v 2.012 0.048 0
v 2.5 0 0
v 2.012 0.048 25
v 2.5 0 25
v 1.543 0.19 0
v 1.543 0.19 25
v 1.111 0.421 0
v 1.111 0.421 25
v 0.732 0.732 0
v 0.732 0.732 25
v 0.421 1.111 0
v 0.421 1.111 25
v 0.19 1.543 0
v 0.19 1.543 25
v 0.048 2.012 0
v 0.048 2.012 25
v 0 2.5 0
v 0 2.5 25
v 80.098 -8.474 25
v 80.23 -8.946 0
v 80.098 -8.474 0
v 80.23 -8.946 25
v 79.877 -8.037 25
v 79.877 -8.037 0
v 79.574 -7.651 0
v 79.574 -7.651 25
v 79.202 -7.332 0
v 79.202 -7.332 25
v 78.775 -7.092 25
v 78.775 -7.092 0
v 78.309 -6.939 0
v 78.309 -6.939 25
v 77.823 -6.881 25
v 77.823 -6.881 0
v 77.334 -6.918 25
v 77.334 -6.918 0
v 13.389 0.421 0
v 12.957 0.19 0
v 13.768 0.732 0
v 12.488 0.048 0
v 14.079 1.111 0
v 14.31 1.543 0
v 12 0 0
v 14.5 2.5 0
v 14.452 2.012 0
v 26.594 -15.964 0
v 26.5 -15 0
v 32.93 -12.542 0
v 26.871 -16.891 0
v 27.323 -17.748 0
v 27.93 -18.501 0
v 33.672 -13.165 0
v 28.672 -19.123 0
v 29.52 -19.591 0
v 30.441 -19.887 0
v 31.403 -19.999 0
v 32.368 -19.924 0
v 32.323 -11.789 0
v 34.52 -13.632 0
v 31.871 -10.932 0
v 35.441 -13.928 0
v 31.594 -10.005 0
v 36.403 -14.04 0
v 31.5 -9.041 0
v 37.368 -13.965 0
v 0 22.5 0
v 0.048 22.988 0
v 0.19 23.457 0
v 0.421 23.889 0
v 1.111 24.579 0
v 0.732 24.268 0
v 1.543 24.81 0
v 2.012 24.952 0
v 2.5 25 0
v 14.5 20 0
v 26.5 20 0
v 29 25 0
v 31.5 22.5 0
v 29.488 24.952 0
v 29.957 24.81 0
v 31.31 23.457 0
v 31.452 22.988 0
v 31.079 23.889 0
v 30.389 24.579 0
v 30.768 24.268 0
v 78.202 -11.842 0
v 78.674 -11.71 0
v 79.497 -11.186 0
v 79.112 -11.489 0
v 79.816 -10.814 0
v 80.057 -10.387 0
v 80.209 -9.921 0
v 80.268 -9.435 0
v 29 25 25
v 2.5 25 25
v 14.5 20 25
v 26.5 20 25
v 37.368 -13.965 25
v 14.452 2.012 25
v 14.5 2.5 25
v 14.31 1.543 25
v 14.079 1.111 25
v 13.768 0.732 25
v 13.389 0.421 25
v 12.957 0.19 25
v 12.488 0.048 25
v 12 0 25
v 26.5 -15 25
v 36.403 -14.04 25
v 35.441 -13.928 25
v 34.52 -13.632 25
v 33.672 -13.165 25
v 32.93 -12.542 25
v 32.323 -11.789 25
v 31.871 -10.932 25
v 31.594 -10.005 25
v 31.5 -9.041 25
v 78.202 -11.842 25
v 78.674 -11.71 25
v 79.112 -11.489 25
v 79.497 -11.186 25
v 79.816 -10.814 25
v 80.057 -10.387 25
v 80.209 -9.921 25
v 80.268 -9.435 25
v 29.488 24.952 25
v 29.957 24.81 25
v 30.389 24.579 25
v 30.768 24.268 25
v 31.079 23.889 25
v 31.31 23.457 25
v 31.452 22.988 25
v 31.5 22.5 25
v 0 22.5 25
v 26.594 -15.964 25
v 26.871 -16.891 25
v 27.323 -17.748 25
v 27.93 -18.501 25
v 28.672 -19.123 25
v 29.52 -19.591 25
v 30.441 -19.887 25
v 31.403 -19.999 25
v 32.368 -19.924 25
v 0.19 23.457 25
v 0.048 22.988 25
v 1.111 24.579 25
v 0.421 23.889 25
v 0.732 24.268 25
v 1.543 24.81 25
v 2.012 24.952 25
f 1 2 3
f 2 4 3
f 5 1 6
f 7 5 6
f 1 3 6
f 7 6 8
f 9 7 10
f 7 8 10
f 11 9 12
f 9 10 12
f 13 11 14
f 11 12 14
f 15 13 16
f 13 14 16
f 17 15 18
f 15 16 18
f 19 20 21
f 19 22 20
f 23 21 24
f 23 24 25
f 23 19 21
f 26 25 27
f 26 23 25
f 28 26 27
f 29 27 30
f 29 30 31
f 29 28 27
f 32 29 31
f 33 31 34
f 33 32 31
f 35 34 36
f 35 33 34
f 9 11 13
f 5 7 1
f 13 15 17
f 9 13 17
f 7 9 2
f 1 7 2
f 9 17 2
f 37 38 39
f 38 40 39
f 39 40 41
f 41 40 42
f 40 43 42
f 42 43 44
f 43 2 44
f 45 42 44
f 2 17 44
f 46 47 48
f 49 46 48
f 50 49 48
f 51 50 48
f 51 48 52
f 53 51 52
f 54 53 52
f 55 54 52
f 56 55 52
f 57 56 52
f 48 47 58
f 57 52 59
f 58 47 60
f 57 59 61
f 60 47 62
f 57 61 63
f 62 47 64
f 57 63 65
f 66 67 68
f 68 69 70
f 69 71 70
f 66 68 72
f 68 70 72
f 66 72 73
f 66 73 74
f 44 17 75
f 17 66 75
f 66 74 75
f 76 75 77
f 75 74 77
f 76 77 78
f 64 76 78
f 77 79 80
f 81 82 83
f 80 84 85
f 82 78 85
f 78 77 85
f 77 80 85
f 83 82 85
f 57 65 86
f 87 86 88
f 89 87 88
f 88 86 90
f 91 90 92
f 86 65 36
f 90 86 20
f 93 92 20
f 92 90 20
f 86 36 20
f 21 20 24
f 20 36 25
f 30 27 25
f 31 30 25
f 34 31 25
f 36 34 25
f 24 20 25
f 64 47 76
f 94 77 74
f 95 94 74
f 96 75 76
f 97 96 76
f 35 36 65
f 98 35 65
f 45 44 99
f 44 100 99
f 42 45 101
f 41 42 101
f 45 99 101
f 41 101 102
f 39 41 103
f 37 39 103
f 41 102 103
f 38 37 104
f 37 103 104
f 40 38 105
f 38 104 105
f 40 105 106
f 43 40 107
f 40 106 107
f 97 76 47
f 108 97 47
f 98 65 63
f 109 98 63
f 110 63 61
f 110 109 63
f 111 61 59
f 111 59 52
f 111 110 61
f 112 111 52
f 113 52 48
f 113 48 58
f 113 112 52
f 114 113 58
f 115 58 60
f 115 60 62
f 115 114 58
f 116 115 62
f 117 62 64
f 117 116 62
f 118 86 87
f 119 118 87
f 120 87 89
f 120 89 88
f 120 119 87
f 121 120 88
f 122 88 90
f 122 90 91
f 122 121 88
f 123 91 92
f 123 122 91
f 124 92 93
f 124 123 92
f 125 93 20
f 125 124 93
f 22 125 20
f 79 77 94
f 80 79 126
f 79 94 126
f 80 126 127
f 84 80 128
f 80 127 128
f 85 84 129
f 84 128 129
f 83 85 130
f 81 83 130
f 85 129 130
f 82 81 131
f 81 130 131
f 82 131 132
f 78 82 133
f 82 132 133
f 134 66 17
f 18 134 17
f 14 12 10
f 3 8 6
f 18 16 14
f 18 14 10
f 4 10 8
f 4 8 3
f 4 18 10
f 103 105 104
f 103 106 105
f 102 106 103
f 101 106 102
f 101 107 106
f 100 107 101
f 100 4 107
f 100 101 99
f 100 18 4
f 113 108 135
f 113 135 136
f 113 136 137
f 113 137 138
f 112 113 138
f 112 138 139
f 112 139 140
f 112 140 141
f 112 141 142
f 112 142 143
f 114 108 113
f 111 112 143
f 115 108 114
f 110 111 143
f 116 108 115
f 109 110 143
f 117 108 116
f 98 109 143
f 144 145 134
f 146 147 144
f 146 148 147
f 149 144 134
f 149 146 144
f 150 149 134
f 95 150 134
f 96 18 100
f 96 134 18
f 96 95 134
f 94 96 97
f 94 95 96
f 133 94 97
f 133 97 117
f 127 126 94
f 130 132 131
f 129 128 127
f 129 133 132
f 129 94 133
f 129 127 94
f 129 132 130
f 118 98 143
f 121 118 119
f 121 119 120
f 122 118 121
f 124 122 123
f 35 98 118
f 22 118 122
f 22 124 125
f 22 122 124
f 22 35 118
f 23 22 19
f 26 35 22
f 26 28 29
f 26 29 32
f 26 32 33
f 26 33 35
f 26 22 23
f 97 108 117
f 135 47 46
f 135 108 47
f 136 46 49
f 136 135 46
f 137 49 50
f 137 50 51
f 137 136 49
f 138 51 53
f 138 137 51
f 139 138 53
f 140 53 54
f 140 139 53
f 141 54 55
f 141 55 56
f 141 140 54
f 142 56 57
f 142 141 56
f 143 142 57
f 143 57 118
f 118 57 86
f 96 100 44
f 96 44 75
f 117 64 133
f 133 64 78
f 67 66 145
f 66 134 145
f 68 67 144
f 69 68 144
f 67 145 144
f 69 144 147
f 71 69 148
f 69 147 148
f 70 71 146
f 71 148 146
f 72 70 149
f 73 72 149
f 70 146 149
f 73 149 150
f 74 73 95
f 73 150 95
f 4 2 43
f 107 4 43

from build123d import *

# Parameters (mm, degrees)
F1_DEPTH = 25
F3_R     = 5
F4_R     = 2.49999


# Not quite as in the source:
# - a fillet or chamfer is up to 0.001 mm smaller than in the source, because OpenCascade refuses the exact size


with BuildPart() as f1:
    # F0 (on Top) → F1 (new body)
    with BuildSketch(Plane.XY):
        Polygon((0, 25), (0, 0), (14.5, 0), (14.5, 20), (26.5, 20), (26.5, -20.958767963), (80.6644264157, -11.4081181913), (79.7961855273, -6.4840794262), (31.5, -15), (31.5, 25), align=None)
    extrude(amount=F1_DEPTH)

    # F3
    f3_edges = [f1.edges().sort_by_distance(p)[0] for p in [
        (26.5, -20.958768, 12.5),
        (31.5, -15, 12.5),
    ]]
    fillet(f3_edges, radius=F3_R)

    # F4 (radius 2.5 in the source; OpenCascade refuses exactly that, so slightly less here)
    f4_edges = [f1.edges().sort_by_distance(p)[0] for p in [
        (31.5, 25, 12.5),
        (79.796186, -6.484079, 12.5),
        (80.664426, -11.408118, 12.5),
        (14.5, 0, 12.5),
        (0, 0, 12.5),
        (0, 25, 12.5),
    ]]
    fillet(f4_edges, radius=F4_R)


solid = f1.part
